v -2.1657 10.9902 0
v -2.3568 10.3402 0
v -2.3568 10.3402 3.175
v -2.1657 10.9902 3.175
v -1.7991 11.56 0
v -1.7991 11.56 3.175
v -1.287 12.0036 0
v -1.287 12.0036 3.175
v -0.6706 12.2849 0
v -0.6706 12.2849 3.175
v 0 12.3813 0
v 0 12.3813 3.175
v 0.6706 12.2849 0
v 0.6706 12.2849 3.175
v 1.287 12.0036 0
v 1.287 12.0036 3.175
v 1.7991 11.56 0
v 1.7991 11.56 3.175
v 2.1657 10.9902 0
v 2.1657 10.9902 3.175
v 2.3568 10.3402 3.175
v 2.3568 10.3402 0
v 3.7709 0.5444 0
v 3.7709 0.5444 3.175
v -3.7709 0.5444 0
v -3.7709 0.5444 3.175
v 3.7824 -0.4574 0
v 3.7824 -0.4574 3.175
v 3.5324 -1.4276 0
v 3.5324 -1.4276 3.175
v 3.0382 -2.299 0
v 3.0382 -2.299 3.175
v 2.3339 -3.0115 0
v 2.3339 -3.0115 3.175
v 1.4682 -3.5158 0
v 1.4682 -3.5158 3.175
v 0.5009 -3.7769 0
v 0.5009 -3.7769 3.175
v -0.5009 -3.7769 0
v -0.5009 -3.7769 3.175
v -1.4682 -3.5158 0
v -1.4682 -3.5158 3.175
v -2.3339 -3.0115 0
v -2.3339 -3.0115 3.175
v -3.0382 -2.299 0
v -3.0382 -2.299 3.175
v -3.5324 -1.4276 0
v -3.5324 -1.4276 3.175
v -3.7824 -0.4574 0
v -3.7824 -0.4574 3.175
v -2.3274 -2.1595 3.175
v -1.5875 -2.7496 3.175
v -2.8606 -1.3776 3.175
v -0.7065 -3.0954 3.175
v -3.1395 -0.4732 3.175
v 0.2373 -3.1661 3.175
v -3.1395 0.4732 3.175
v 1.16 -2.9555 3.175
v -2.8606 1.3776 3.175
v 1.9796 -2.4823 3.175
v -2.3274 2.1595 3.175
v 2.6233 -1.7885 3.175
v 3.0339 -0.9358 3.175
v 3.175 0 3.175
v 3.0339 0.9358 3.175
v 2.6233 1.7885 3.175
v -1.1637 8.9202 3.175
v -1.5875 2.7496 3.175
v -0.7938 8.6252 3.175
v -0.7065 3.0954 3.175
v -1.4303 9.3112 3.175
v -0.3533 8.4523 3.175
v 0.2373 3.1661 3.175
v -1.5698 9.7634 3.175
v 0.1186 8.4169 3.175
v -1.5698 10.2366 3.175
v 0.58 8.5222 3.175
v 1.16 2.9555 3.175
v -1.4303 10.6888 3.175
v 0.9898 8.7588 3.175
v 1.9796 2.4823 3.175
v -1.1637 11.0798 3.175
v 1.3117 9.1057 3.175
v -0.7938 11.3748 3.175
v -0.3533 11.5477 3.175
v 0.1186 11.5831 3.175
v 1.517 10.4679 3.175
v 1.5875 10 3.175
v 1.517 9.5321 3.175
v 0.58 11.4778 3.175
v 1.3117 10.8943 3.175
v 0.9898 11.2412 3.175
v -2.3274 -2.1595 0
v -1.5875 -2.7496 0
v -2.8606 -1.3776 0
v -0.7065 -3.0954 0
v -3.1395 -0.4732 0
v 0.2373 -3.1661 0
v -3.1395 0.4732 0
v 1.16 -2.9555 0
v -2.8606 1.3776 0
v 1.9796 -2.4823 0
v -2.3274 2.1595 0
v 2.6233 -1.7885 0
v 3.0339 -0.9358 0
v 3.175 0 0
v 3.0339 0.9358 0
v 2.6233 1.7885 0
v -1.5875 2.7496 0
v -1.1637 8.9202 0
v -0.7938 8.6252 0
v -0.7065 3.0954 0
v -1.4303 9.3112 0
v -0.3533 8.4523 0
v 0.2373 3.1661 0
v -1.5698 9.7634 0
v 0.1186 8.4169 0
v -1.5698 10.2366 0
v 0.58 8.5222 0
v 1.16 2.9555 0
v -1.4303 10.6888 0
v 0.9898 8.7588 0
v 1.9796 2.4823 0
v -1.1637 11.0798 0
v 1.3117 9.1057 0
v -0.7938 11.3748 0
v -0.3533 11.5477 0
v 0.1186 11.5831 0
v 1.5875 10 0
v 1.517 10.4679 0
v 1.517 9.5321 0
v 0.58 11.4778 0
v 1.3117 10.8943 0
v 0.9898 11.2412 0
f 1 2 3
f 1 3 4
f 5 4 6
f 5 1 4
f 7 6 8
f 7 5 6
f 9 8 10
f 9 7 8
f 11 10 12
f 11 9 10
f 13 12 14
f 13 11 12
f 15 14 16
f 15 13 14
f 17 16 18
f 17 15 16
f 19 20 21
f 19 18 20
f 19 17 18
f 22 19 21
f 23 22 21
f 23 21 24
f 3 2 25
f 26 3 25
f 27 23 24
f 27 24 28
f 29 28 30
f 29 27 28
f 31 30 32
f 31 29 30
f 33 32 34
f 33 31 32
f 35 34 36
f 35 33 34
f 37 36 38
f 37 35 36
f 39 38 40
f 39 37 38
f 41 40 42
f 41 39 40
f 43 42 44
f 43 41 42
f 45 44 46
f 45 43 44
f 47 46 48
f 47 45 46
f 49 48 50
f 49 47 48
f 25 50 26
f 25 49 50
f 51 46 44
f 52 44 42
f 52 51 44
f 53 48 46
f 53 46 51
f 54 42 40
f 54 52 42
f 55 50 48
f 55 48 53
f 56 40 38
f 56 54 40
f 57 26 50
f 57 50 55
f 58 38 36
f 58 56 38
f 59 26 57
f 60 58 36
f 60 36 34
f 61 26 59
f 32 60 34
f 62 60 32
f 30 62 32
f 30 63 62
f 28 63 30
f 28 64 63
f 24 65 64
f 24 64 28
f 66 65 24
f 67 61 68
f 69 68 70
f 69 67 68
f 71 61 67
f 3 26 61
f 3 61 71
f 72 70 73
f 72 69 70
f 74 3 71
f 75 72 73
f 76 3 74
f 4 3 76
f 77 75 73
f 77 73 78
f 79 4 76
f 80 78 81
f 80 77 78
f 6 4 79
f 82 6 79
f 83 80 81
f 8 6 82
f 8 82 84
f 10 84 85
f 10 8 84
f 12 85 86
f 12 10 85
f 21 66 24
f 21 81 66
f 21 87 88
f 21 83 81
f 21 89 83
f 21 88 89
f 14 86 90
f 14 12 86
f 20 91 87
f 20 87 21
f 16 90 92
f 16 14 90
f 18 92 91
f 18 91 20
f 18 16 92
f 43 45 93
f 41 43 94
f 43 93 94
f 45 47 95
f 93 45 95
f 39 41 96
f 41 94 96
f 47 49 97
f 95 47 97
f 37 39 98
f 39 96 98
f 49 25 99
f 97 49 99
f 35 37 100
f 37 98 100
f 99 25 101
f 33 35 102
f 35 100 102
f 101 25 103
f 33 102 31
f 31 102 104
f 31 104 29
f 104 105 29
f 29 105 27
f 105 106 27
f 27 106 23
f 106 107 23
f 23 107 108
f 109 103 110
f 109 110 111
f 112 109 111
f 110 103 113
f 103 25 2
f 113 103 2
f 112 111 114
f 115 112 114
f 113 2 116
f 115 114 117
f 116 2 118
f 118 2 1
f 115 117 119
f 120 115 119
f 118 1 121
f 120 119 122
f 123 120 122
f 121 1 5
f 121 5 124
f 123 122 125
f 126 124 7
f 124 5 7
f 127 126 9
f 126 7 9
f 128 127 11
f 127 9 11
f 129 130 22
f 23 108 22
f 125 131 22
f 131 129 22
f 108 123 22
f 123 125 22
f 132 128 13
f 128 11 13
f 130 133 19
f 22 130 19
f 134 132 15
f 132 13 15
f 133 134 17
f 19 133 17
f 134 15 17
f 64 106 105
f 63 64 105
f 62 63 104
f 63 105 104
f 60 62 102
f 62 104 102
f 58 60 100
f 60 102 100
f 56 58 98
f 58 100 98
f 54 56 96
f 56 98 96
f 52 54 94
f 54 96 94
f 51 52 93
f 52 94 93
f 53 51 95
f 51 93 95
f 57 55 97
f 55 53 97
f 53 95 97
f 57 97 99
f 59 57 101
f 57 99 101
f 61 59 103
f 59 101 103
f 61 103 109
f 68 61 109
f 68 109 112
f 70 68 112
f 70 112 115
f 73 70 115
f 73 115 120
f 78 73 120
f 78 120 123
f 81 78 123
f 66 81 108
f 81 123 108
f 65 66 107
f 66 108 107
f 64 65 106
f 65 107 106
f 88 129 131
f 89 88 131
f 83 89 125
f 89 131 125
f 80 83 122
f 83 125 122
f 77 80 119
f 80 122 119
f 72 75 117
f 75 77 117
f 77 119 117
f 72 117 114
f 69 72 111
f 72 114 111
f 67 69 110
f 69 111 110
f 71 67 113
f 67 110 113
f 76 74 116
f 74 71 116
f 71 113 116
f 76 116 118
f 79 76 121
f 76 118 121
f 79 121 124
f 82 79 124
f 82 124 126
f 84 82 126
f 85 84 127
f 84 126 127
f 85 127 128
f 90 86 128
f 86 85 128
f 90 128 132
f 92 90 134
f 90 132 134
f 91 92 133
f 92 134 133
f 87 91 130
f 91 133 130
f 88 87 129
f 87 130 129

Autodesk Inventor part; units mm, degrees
ref_plane "YZ Plane" through (0, 0, 0) normal (1, 0, 0) x (0, 1, 0)
ref_plane "XZ Plane" through (0, 0, 0) normal (0, 1, 0) x (-1, 0, 0)
ref_plane "XY Plane" through (0, 0, 0) normal (0, 0, 1) x (1, 0, 0)
sketch "Sketch1" plane through (0, 0, 0) normal (0, 0, 1) x (1, 0, 0)
  circle A0 centre (0, 0) radius 3.175
  circle A1 centre (0, 0) radius 3.81
  circle A2 centre (0, 10) radius 1.5875
  circle A3 centre (0, 10) radius 2.3813
  line L0 (-2.3568, 10.3402) -> (-3.7709, 0.5444)
  line L1 (2.3568, 10.3402) -> (3.7709, 0.5444)
  dimension "d0" = 6.35
  dimension "d1" = 7.62
  dimension "d2" = 3.175
  dimension "d3" = 4.7625
  dimension "d6" = 10
extrude "Extrusion1" add sketch "Sketch1" along normal blind 3.175
